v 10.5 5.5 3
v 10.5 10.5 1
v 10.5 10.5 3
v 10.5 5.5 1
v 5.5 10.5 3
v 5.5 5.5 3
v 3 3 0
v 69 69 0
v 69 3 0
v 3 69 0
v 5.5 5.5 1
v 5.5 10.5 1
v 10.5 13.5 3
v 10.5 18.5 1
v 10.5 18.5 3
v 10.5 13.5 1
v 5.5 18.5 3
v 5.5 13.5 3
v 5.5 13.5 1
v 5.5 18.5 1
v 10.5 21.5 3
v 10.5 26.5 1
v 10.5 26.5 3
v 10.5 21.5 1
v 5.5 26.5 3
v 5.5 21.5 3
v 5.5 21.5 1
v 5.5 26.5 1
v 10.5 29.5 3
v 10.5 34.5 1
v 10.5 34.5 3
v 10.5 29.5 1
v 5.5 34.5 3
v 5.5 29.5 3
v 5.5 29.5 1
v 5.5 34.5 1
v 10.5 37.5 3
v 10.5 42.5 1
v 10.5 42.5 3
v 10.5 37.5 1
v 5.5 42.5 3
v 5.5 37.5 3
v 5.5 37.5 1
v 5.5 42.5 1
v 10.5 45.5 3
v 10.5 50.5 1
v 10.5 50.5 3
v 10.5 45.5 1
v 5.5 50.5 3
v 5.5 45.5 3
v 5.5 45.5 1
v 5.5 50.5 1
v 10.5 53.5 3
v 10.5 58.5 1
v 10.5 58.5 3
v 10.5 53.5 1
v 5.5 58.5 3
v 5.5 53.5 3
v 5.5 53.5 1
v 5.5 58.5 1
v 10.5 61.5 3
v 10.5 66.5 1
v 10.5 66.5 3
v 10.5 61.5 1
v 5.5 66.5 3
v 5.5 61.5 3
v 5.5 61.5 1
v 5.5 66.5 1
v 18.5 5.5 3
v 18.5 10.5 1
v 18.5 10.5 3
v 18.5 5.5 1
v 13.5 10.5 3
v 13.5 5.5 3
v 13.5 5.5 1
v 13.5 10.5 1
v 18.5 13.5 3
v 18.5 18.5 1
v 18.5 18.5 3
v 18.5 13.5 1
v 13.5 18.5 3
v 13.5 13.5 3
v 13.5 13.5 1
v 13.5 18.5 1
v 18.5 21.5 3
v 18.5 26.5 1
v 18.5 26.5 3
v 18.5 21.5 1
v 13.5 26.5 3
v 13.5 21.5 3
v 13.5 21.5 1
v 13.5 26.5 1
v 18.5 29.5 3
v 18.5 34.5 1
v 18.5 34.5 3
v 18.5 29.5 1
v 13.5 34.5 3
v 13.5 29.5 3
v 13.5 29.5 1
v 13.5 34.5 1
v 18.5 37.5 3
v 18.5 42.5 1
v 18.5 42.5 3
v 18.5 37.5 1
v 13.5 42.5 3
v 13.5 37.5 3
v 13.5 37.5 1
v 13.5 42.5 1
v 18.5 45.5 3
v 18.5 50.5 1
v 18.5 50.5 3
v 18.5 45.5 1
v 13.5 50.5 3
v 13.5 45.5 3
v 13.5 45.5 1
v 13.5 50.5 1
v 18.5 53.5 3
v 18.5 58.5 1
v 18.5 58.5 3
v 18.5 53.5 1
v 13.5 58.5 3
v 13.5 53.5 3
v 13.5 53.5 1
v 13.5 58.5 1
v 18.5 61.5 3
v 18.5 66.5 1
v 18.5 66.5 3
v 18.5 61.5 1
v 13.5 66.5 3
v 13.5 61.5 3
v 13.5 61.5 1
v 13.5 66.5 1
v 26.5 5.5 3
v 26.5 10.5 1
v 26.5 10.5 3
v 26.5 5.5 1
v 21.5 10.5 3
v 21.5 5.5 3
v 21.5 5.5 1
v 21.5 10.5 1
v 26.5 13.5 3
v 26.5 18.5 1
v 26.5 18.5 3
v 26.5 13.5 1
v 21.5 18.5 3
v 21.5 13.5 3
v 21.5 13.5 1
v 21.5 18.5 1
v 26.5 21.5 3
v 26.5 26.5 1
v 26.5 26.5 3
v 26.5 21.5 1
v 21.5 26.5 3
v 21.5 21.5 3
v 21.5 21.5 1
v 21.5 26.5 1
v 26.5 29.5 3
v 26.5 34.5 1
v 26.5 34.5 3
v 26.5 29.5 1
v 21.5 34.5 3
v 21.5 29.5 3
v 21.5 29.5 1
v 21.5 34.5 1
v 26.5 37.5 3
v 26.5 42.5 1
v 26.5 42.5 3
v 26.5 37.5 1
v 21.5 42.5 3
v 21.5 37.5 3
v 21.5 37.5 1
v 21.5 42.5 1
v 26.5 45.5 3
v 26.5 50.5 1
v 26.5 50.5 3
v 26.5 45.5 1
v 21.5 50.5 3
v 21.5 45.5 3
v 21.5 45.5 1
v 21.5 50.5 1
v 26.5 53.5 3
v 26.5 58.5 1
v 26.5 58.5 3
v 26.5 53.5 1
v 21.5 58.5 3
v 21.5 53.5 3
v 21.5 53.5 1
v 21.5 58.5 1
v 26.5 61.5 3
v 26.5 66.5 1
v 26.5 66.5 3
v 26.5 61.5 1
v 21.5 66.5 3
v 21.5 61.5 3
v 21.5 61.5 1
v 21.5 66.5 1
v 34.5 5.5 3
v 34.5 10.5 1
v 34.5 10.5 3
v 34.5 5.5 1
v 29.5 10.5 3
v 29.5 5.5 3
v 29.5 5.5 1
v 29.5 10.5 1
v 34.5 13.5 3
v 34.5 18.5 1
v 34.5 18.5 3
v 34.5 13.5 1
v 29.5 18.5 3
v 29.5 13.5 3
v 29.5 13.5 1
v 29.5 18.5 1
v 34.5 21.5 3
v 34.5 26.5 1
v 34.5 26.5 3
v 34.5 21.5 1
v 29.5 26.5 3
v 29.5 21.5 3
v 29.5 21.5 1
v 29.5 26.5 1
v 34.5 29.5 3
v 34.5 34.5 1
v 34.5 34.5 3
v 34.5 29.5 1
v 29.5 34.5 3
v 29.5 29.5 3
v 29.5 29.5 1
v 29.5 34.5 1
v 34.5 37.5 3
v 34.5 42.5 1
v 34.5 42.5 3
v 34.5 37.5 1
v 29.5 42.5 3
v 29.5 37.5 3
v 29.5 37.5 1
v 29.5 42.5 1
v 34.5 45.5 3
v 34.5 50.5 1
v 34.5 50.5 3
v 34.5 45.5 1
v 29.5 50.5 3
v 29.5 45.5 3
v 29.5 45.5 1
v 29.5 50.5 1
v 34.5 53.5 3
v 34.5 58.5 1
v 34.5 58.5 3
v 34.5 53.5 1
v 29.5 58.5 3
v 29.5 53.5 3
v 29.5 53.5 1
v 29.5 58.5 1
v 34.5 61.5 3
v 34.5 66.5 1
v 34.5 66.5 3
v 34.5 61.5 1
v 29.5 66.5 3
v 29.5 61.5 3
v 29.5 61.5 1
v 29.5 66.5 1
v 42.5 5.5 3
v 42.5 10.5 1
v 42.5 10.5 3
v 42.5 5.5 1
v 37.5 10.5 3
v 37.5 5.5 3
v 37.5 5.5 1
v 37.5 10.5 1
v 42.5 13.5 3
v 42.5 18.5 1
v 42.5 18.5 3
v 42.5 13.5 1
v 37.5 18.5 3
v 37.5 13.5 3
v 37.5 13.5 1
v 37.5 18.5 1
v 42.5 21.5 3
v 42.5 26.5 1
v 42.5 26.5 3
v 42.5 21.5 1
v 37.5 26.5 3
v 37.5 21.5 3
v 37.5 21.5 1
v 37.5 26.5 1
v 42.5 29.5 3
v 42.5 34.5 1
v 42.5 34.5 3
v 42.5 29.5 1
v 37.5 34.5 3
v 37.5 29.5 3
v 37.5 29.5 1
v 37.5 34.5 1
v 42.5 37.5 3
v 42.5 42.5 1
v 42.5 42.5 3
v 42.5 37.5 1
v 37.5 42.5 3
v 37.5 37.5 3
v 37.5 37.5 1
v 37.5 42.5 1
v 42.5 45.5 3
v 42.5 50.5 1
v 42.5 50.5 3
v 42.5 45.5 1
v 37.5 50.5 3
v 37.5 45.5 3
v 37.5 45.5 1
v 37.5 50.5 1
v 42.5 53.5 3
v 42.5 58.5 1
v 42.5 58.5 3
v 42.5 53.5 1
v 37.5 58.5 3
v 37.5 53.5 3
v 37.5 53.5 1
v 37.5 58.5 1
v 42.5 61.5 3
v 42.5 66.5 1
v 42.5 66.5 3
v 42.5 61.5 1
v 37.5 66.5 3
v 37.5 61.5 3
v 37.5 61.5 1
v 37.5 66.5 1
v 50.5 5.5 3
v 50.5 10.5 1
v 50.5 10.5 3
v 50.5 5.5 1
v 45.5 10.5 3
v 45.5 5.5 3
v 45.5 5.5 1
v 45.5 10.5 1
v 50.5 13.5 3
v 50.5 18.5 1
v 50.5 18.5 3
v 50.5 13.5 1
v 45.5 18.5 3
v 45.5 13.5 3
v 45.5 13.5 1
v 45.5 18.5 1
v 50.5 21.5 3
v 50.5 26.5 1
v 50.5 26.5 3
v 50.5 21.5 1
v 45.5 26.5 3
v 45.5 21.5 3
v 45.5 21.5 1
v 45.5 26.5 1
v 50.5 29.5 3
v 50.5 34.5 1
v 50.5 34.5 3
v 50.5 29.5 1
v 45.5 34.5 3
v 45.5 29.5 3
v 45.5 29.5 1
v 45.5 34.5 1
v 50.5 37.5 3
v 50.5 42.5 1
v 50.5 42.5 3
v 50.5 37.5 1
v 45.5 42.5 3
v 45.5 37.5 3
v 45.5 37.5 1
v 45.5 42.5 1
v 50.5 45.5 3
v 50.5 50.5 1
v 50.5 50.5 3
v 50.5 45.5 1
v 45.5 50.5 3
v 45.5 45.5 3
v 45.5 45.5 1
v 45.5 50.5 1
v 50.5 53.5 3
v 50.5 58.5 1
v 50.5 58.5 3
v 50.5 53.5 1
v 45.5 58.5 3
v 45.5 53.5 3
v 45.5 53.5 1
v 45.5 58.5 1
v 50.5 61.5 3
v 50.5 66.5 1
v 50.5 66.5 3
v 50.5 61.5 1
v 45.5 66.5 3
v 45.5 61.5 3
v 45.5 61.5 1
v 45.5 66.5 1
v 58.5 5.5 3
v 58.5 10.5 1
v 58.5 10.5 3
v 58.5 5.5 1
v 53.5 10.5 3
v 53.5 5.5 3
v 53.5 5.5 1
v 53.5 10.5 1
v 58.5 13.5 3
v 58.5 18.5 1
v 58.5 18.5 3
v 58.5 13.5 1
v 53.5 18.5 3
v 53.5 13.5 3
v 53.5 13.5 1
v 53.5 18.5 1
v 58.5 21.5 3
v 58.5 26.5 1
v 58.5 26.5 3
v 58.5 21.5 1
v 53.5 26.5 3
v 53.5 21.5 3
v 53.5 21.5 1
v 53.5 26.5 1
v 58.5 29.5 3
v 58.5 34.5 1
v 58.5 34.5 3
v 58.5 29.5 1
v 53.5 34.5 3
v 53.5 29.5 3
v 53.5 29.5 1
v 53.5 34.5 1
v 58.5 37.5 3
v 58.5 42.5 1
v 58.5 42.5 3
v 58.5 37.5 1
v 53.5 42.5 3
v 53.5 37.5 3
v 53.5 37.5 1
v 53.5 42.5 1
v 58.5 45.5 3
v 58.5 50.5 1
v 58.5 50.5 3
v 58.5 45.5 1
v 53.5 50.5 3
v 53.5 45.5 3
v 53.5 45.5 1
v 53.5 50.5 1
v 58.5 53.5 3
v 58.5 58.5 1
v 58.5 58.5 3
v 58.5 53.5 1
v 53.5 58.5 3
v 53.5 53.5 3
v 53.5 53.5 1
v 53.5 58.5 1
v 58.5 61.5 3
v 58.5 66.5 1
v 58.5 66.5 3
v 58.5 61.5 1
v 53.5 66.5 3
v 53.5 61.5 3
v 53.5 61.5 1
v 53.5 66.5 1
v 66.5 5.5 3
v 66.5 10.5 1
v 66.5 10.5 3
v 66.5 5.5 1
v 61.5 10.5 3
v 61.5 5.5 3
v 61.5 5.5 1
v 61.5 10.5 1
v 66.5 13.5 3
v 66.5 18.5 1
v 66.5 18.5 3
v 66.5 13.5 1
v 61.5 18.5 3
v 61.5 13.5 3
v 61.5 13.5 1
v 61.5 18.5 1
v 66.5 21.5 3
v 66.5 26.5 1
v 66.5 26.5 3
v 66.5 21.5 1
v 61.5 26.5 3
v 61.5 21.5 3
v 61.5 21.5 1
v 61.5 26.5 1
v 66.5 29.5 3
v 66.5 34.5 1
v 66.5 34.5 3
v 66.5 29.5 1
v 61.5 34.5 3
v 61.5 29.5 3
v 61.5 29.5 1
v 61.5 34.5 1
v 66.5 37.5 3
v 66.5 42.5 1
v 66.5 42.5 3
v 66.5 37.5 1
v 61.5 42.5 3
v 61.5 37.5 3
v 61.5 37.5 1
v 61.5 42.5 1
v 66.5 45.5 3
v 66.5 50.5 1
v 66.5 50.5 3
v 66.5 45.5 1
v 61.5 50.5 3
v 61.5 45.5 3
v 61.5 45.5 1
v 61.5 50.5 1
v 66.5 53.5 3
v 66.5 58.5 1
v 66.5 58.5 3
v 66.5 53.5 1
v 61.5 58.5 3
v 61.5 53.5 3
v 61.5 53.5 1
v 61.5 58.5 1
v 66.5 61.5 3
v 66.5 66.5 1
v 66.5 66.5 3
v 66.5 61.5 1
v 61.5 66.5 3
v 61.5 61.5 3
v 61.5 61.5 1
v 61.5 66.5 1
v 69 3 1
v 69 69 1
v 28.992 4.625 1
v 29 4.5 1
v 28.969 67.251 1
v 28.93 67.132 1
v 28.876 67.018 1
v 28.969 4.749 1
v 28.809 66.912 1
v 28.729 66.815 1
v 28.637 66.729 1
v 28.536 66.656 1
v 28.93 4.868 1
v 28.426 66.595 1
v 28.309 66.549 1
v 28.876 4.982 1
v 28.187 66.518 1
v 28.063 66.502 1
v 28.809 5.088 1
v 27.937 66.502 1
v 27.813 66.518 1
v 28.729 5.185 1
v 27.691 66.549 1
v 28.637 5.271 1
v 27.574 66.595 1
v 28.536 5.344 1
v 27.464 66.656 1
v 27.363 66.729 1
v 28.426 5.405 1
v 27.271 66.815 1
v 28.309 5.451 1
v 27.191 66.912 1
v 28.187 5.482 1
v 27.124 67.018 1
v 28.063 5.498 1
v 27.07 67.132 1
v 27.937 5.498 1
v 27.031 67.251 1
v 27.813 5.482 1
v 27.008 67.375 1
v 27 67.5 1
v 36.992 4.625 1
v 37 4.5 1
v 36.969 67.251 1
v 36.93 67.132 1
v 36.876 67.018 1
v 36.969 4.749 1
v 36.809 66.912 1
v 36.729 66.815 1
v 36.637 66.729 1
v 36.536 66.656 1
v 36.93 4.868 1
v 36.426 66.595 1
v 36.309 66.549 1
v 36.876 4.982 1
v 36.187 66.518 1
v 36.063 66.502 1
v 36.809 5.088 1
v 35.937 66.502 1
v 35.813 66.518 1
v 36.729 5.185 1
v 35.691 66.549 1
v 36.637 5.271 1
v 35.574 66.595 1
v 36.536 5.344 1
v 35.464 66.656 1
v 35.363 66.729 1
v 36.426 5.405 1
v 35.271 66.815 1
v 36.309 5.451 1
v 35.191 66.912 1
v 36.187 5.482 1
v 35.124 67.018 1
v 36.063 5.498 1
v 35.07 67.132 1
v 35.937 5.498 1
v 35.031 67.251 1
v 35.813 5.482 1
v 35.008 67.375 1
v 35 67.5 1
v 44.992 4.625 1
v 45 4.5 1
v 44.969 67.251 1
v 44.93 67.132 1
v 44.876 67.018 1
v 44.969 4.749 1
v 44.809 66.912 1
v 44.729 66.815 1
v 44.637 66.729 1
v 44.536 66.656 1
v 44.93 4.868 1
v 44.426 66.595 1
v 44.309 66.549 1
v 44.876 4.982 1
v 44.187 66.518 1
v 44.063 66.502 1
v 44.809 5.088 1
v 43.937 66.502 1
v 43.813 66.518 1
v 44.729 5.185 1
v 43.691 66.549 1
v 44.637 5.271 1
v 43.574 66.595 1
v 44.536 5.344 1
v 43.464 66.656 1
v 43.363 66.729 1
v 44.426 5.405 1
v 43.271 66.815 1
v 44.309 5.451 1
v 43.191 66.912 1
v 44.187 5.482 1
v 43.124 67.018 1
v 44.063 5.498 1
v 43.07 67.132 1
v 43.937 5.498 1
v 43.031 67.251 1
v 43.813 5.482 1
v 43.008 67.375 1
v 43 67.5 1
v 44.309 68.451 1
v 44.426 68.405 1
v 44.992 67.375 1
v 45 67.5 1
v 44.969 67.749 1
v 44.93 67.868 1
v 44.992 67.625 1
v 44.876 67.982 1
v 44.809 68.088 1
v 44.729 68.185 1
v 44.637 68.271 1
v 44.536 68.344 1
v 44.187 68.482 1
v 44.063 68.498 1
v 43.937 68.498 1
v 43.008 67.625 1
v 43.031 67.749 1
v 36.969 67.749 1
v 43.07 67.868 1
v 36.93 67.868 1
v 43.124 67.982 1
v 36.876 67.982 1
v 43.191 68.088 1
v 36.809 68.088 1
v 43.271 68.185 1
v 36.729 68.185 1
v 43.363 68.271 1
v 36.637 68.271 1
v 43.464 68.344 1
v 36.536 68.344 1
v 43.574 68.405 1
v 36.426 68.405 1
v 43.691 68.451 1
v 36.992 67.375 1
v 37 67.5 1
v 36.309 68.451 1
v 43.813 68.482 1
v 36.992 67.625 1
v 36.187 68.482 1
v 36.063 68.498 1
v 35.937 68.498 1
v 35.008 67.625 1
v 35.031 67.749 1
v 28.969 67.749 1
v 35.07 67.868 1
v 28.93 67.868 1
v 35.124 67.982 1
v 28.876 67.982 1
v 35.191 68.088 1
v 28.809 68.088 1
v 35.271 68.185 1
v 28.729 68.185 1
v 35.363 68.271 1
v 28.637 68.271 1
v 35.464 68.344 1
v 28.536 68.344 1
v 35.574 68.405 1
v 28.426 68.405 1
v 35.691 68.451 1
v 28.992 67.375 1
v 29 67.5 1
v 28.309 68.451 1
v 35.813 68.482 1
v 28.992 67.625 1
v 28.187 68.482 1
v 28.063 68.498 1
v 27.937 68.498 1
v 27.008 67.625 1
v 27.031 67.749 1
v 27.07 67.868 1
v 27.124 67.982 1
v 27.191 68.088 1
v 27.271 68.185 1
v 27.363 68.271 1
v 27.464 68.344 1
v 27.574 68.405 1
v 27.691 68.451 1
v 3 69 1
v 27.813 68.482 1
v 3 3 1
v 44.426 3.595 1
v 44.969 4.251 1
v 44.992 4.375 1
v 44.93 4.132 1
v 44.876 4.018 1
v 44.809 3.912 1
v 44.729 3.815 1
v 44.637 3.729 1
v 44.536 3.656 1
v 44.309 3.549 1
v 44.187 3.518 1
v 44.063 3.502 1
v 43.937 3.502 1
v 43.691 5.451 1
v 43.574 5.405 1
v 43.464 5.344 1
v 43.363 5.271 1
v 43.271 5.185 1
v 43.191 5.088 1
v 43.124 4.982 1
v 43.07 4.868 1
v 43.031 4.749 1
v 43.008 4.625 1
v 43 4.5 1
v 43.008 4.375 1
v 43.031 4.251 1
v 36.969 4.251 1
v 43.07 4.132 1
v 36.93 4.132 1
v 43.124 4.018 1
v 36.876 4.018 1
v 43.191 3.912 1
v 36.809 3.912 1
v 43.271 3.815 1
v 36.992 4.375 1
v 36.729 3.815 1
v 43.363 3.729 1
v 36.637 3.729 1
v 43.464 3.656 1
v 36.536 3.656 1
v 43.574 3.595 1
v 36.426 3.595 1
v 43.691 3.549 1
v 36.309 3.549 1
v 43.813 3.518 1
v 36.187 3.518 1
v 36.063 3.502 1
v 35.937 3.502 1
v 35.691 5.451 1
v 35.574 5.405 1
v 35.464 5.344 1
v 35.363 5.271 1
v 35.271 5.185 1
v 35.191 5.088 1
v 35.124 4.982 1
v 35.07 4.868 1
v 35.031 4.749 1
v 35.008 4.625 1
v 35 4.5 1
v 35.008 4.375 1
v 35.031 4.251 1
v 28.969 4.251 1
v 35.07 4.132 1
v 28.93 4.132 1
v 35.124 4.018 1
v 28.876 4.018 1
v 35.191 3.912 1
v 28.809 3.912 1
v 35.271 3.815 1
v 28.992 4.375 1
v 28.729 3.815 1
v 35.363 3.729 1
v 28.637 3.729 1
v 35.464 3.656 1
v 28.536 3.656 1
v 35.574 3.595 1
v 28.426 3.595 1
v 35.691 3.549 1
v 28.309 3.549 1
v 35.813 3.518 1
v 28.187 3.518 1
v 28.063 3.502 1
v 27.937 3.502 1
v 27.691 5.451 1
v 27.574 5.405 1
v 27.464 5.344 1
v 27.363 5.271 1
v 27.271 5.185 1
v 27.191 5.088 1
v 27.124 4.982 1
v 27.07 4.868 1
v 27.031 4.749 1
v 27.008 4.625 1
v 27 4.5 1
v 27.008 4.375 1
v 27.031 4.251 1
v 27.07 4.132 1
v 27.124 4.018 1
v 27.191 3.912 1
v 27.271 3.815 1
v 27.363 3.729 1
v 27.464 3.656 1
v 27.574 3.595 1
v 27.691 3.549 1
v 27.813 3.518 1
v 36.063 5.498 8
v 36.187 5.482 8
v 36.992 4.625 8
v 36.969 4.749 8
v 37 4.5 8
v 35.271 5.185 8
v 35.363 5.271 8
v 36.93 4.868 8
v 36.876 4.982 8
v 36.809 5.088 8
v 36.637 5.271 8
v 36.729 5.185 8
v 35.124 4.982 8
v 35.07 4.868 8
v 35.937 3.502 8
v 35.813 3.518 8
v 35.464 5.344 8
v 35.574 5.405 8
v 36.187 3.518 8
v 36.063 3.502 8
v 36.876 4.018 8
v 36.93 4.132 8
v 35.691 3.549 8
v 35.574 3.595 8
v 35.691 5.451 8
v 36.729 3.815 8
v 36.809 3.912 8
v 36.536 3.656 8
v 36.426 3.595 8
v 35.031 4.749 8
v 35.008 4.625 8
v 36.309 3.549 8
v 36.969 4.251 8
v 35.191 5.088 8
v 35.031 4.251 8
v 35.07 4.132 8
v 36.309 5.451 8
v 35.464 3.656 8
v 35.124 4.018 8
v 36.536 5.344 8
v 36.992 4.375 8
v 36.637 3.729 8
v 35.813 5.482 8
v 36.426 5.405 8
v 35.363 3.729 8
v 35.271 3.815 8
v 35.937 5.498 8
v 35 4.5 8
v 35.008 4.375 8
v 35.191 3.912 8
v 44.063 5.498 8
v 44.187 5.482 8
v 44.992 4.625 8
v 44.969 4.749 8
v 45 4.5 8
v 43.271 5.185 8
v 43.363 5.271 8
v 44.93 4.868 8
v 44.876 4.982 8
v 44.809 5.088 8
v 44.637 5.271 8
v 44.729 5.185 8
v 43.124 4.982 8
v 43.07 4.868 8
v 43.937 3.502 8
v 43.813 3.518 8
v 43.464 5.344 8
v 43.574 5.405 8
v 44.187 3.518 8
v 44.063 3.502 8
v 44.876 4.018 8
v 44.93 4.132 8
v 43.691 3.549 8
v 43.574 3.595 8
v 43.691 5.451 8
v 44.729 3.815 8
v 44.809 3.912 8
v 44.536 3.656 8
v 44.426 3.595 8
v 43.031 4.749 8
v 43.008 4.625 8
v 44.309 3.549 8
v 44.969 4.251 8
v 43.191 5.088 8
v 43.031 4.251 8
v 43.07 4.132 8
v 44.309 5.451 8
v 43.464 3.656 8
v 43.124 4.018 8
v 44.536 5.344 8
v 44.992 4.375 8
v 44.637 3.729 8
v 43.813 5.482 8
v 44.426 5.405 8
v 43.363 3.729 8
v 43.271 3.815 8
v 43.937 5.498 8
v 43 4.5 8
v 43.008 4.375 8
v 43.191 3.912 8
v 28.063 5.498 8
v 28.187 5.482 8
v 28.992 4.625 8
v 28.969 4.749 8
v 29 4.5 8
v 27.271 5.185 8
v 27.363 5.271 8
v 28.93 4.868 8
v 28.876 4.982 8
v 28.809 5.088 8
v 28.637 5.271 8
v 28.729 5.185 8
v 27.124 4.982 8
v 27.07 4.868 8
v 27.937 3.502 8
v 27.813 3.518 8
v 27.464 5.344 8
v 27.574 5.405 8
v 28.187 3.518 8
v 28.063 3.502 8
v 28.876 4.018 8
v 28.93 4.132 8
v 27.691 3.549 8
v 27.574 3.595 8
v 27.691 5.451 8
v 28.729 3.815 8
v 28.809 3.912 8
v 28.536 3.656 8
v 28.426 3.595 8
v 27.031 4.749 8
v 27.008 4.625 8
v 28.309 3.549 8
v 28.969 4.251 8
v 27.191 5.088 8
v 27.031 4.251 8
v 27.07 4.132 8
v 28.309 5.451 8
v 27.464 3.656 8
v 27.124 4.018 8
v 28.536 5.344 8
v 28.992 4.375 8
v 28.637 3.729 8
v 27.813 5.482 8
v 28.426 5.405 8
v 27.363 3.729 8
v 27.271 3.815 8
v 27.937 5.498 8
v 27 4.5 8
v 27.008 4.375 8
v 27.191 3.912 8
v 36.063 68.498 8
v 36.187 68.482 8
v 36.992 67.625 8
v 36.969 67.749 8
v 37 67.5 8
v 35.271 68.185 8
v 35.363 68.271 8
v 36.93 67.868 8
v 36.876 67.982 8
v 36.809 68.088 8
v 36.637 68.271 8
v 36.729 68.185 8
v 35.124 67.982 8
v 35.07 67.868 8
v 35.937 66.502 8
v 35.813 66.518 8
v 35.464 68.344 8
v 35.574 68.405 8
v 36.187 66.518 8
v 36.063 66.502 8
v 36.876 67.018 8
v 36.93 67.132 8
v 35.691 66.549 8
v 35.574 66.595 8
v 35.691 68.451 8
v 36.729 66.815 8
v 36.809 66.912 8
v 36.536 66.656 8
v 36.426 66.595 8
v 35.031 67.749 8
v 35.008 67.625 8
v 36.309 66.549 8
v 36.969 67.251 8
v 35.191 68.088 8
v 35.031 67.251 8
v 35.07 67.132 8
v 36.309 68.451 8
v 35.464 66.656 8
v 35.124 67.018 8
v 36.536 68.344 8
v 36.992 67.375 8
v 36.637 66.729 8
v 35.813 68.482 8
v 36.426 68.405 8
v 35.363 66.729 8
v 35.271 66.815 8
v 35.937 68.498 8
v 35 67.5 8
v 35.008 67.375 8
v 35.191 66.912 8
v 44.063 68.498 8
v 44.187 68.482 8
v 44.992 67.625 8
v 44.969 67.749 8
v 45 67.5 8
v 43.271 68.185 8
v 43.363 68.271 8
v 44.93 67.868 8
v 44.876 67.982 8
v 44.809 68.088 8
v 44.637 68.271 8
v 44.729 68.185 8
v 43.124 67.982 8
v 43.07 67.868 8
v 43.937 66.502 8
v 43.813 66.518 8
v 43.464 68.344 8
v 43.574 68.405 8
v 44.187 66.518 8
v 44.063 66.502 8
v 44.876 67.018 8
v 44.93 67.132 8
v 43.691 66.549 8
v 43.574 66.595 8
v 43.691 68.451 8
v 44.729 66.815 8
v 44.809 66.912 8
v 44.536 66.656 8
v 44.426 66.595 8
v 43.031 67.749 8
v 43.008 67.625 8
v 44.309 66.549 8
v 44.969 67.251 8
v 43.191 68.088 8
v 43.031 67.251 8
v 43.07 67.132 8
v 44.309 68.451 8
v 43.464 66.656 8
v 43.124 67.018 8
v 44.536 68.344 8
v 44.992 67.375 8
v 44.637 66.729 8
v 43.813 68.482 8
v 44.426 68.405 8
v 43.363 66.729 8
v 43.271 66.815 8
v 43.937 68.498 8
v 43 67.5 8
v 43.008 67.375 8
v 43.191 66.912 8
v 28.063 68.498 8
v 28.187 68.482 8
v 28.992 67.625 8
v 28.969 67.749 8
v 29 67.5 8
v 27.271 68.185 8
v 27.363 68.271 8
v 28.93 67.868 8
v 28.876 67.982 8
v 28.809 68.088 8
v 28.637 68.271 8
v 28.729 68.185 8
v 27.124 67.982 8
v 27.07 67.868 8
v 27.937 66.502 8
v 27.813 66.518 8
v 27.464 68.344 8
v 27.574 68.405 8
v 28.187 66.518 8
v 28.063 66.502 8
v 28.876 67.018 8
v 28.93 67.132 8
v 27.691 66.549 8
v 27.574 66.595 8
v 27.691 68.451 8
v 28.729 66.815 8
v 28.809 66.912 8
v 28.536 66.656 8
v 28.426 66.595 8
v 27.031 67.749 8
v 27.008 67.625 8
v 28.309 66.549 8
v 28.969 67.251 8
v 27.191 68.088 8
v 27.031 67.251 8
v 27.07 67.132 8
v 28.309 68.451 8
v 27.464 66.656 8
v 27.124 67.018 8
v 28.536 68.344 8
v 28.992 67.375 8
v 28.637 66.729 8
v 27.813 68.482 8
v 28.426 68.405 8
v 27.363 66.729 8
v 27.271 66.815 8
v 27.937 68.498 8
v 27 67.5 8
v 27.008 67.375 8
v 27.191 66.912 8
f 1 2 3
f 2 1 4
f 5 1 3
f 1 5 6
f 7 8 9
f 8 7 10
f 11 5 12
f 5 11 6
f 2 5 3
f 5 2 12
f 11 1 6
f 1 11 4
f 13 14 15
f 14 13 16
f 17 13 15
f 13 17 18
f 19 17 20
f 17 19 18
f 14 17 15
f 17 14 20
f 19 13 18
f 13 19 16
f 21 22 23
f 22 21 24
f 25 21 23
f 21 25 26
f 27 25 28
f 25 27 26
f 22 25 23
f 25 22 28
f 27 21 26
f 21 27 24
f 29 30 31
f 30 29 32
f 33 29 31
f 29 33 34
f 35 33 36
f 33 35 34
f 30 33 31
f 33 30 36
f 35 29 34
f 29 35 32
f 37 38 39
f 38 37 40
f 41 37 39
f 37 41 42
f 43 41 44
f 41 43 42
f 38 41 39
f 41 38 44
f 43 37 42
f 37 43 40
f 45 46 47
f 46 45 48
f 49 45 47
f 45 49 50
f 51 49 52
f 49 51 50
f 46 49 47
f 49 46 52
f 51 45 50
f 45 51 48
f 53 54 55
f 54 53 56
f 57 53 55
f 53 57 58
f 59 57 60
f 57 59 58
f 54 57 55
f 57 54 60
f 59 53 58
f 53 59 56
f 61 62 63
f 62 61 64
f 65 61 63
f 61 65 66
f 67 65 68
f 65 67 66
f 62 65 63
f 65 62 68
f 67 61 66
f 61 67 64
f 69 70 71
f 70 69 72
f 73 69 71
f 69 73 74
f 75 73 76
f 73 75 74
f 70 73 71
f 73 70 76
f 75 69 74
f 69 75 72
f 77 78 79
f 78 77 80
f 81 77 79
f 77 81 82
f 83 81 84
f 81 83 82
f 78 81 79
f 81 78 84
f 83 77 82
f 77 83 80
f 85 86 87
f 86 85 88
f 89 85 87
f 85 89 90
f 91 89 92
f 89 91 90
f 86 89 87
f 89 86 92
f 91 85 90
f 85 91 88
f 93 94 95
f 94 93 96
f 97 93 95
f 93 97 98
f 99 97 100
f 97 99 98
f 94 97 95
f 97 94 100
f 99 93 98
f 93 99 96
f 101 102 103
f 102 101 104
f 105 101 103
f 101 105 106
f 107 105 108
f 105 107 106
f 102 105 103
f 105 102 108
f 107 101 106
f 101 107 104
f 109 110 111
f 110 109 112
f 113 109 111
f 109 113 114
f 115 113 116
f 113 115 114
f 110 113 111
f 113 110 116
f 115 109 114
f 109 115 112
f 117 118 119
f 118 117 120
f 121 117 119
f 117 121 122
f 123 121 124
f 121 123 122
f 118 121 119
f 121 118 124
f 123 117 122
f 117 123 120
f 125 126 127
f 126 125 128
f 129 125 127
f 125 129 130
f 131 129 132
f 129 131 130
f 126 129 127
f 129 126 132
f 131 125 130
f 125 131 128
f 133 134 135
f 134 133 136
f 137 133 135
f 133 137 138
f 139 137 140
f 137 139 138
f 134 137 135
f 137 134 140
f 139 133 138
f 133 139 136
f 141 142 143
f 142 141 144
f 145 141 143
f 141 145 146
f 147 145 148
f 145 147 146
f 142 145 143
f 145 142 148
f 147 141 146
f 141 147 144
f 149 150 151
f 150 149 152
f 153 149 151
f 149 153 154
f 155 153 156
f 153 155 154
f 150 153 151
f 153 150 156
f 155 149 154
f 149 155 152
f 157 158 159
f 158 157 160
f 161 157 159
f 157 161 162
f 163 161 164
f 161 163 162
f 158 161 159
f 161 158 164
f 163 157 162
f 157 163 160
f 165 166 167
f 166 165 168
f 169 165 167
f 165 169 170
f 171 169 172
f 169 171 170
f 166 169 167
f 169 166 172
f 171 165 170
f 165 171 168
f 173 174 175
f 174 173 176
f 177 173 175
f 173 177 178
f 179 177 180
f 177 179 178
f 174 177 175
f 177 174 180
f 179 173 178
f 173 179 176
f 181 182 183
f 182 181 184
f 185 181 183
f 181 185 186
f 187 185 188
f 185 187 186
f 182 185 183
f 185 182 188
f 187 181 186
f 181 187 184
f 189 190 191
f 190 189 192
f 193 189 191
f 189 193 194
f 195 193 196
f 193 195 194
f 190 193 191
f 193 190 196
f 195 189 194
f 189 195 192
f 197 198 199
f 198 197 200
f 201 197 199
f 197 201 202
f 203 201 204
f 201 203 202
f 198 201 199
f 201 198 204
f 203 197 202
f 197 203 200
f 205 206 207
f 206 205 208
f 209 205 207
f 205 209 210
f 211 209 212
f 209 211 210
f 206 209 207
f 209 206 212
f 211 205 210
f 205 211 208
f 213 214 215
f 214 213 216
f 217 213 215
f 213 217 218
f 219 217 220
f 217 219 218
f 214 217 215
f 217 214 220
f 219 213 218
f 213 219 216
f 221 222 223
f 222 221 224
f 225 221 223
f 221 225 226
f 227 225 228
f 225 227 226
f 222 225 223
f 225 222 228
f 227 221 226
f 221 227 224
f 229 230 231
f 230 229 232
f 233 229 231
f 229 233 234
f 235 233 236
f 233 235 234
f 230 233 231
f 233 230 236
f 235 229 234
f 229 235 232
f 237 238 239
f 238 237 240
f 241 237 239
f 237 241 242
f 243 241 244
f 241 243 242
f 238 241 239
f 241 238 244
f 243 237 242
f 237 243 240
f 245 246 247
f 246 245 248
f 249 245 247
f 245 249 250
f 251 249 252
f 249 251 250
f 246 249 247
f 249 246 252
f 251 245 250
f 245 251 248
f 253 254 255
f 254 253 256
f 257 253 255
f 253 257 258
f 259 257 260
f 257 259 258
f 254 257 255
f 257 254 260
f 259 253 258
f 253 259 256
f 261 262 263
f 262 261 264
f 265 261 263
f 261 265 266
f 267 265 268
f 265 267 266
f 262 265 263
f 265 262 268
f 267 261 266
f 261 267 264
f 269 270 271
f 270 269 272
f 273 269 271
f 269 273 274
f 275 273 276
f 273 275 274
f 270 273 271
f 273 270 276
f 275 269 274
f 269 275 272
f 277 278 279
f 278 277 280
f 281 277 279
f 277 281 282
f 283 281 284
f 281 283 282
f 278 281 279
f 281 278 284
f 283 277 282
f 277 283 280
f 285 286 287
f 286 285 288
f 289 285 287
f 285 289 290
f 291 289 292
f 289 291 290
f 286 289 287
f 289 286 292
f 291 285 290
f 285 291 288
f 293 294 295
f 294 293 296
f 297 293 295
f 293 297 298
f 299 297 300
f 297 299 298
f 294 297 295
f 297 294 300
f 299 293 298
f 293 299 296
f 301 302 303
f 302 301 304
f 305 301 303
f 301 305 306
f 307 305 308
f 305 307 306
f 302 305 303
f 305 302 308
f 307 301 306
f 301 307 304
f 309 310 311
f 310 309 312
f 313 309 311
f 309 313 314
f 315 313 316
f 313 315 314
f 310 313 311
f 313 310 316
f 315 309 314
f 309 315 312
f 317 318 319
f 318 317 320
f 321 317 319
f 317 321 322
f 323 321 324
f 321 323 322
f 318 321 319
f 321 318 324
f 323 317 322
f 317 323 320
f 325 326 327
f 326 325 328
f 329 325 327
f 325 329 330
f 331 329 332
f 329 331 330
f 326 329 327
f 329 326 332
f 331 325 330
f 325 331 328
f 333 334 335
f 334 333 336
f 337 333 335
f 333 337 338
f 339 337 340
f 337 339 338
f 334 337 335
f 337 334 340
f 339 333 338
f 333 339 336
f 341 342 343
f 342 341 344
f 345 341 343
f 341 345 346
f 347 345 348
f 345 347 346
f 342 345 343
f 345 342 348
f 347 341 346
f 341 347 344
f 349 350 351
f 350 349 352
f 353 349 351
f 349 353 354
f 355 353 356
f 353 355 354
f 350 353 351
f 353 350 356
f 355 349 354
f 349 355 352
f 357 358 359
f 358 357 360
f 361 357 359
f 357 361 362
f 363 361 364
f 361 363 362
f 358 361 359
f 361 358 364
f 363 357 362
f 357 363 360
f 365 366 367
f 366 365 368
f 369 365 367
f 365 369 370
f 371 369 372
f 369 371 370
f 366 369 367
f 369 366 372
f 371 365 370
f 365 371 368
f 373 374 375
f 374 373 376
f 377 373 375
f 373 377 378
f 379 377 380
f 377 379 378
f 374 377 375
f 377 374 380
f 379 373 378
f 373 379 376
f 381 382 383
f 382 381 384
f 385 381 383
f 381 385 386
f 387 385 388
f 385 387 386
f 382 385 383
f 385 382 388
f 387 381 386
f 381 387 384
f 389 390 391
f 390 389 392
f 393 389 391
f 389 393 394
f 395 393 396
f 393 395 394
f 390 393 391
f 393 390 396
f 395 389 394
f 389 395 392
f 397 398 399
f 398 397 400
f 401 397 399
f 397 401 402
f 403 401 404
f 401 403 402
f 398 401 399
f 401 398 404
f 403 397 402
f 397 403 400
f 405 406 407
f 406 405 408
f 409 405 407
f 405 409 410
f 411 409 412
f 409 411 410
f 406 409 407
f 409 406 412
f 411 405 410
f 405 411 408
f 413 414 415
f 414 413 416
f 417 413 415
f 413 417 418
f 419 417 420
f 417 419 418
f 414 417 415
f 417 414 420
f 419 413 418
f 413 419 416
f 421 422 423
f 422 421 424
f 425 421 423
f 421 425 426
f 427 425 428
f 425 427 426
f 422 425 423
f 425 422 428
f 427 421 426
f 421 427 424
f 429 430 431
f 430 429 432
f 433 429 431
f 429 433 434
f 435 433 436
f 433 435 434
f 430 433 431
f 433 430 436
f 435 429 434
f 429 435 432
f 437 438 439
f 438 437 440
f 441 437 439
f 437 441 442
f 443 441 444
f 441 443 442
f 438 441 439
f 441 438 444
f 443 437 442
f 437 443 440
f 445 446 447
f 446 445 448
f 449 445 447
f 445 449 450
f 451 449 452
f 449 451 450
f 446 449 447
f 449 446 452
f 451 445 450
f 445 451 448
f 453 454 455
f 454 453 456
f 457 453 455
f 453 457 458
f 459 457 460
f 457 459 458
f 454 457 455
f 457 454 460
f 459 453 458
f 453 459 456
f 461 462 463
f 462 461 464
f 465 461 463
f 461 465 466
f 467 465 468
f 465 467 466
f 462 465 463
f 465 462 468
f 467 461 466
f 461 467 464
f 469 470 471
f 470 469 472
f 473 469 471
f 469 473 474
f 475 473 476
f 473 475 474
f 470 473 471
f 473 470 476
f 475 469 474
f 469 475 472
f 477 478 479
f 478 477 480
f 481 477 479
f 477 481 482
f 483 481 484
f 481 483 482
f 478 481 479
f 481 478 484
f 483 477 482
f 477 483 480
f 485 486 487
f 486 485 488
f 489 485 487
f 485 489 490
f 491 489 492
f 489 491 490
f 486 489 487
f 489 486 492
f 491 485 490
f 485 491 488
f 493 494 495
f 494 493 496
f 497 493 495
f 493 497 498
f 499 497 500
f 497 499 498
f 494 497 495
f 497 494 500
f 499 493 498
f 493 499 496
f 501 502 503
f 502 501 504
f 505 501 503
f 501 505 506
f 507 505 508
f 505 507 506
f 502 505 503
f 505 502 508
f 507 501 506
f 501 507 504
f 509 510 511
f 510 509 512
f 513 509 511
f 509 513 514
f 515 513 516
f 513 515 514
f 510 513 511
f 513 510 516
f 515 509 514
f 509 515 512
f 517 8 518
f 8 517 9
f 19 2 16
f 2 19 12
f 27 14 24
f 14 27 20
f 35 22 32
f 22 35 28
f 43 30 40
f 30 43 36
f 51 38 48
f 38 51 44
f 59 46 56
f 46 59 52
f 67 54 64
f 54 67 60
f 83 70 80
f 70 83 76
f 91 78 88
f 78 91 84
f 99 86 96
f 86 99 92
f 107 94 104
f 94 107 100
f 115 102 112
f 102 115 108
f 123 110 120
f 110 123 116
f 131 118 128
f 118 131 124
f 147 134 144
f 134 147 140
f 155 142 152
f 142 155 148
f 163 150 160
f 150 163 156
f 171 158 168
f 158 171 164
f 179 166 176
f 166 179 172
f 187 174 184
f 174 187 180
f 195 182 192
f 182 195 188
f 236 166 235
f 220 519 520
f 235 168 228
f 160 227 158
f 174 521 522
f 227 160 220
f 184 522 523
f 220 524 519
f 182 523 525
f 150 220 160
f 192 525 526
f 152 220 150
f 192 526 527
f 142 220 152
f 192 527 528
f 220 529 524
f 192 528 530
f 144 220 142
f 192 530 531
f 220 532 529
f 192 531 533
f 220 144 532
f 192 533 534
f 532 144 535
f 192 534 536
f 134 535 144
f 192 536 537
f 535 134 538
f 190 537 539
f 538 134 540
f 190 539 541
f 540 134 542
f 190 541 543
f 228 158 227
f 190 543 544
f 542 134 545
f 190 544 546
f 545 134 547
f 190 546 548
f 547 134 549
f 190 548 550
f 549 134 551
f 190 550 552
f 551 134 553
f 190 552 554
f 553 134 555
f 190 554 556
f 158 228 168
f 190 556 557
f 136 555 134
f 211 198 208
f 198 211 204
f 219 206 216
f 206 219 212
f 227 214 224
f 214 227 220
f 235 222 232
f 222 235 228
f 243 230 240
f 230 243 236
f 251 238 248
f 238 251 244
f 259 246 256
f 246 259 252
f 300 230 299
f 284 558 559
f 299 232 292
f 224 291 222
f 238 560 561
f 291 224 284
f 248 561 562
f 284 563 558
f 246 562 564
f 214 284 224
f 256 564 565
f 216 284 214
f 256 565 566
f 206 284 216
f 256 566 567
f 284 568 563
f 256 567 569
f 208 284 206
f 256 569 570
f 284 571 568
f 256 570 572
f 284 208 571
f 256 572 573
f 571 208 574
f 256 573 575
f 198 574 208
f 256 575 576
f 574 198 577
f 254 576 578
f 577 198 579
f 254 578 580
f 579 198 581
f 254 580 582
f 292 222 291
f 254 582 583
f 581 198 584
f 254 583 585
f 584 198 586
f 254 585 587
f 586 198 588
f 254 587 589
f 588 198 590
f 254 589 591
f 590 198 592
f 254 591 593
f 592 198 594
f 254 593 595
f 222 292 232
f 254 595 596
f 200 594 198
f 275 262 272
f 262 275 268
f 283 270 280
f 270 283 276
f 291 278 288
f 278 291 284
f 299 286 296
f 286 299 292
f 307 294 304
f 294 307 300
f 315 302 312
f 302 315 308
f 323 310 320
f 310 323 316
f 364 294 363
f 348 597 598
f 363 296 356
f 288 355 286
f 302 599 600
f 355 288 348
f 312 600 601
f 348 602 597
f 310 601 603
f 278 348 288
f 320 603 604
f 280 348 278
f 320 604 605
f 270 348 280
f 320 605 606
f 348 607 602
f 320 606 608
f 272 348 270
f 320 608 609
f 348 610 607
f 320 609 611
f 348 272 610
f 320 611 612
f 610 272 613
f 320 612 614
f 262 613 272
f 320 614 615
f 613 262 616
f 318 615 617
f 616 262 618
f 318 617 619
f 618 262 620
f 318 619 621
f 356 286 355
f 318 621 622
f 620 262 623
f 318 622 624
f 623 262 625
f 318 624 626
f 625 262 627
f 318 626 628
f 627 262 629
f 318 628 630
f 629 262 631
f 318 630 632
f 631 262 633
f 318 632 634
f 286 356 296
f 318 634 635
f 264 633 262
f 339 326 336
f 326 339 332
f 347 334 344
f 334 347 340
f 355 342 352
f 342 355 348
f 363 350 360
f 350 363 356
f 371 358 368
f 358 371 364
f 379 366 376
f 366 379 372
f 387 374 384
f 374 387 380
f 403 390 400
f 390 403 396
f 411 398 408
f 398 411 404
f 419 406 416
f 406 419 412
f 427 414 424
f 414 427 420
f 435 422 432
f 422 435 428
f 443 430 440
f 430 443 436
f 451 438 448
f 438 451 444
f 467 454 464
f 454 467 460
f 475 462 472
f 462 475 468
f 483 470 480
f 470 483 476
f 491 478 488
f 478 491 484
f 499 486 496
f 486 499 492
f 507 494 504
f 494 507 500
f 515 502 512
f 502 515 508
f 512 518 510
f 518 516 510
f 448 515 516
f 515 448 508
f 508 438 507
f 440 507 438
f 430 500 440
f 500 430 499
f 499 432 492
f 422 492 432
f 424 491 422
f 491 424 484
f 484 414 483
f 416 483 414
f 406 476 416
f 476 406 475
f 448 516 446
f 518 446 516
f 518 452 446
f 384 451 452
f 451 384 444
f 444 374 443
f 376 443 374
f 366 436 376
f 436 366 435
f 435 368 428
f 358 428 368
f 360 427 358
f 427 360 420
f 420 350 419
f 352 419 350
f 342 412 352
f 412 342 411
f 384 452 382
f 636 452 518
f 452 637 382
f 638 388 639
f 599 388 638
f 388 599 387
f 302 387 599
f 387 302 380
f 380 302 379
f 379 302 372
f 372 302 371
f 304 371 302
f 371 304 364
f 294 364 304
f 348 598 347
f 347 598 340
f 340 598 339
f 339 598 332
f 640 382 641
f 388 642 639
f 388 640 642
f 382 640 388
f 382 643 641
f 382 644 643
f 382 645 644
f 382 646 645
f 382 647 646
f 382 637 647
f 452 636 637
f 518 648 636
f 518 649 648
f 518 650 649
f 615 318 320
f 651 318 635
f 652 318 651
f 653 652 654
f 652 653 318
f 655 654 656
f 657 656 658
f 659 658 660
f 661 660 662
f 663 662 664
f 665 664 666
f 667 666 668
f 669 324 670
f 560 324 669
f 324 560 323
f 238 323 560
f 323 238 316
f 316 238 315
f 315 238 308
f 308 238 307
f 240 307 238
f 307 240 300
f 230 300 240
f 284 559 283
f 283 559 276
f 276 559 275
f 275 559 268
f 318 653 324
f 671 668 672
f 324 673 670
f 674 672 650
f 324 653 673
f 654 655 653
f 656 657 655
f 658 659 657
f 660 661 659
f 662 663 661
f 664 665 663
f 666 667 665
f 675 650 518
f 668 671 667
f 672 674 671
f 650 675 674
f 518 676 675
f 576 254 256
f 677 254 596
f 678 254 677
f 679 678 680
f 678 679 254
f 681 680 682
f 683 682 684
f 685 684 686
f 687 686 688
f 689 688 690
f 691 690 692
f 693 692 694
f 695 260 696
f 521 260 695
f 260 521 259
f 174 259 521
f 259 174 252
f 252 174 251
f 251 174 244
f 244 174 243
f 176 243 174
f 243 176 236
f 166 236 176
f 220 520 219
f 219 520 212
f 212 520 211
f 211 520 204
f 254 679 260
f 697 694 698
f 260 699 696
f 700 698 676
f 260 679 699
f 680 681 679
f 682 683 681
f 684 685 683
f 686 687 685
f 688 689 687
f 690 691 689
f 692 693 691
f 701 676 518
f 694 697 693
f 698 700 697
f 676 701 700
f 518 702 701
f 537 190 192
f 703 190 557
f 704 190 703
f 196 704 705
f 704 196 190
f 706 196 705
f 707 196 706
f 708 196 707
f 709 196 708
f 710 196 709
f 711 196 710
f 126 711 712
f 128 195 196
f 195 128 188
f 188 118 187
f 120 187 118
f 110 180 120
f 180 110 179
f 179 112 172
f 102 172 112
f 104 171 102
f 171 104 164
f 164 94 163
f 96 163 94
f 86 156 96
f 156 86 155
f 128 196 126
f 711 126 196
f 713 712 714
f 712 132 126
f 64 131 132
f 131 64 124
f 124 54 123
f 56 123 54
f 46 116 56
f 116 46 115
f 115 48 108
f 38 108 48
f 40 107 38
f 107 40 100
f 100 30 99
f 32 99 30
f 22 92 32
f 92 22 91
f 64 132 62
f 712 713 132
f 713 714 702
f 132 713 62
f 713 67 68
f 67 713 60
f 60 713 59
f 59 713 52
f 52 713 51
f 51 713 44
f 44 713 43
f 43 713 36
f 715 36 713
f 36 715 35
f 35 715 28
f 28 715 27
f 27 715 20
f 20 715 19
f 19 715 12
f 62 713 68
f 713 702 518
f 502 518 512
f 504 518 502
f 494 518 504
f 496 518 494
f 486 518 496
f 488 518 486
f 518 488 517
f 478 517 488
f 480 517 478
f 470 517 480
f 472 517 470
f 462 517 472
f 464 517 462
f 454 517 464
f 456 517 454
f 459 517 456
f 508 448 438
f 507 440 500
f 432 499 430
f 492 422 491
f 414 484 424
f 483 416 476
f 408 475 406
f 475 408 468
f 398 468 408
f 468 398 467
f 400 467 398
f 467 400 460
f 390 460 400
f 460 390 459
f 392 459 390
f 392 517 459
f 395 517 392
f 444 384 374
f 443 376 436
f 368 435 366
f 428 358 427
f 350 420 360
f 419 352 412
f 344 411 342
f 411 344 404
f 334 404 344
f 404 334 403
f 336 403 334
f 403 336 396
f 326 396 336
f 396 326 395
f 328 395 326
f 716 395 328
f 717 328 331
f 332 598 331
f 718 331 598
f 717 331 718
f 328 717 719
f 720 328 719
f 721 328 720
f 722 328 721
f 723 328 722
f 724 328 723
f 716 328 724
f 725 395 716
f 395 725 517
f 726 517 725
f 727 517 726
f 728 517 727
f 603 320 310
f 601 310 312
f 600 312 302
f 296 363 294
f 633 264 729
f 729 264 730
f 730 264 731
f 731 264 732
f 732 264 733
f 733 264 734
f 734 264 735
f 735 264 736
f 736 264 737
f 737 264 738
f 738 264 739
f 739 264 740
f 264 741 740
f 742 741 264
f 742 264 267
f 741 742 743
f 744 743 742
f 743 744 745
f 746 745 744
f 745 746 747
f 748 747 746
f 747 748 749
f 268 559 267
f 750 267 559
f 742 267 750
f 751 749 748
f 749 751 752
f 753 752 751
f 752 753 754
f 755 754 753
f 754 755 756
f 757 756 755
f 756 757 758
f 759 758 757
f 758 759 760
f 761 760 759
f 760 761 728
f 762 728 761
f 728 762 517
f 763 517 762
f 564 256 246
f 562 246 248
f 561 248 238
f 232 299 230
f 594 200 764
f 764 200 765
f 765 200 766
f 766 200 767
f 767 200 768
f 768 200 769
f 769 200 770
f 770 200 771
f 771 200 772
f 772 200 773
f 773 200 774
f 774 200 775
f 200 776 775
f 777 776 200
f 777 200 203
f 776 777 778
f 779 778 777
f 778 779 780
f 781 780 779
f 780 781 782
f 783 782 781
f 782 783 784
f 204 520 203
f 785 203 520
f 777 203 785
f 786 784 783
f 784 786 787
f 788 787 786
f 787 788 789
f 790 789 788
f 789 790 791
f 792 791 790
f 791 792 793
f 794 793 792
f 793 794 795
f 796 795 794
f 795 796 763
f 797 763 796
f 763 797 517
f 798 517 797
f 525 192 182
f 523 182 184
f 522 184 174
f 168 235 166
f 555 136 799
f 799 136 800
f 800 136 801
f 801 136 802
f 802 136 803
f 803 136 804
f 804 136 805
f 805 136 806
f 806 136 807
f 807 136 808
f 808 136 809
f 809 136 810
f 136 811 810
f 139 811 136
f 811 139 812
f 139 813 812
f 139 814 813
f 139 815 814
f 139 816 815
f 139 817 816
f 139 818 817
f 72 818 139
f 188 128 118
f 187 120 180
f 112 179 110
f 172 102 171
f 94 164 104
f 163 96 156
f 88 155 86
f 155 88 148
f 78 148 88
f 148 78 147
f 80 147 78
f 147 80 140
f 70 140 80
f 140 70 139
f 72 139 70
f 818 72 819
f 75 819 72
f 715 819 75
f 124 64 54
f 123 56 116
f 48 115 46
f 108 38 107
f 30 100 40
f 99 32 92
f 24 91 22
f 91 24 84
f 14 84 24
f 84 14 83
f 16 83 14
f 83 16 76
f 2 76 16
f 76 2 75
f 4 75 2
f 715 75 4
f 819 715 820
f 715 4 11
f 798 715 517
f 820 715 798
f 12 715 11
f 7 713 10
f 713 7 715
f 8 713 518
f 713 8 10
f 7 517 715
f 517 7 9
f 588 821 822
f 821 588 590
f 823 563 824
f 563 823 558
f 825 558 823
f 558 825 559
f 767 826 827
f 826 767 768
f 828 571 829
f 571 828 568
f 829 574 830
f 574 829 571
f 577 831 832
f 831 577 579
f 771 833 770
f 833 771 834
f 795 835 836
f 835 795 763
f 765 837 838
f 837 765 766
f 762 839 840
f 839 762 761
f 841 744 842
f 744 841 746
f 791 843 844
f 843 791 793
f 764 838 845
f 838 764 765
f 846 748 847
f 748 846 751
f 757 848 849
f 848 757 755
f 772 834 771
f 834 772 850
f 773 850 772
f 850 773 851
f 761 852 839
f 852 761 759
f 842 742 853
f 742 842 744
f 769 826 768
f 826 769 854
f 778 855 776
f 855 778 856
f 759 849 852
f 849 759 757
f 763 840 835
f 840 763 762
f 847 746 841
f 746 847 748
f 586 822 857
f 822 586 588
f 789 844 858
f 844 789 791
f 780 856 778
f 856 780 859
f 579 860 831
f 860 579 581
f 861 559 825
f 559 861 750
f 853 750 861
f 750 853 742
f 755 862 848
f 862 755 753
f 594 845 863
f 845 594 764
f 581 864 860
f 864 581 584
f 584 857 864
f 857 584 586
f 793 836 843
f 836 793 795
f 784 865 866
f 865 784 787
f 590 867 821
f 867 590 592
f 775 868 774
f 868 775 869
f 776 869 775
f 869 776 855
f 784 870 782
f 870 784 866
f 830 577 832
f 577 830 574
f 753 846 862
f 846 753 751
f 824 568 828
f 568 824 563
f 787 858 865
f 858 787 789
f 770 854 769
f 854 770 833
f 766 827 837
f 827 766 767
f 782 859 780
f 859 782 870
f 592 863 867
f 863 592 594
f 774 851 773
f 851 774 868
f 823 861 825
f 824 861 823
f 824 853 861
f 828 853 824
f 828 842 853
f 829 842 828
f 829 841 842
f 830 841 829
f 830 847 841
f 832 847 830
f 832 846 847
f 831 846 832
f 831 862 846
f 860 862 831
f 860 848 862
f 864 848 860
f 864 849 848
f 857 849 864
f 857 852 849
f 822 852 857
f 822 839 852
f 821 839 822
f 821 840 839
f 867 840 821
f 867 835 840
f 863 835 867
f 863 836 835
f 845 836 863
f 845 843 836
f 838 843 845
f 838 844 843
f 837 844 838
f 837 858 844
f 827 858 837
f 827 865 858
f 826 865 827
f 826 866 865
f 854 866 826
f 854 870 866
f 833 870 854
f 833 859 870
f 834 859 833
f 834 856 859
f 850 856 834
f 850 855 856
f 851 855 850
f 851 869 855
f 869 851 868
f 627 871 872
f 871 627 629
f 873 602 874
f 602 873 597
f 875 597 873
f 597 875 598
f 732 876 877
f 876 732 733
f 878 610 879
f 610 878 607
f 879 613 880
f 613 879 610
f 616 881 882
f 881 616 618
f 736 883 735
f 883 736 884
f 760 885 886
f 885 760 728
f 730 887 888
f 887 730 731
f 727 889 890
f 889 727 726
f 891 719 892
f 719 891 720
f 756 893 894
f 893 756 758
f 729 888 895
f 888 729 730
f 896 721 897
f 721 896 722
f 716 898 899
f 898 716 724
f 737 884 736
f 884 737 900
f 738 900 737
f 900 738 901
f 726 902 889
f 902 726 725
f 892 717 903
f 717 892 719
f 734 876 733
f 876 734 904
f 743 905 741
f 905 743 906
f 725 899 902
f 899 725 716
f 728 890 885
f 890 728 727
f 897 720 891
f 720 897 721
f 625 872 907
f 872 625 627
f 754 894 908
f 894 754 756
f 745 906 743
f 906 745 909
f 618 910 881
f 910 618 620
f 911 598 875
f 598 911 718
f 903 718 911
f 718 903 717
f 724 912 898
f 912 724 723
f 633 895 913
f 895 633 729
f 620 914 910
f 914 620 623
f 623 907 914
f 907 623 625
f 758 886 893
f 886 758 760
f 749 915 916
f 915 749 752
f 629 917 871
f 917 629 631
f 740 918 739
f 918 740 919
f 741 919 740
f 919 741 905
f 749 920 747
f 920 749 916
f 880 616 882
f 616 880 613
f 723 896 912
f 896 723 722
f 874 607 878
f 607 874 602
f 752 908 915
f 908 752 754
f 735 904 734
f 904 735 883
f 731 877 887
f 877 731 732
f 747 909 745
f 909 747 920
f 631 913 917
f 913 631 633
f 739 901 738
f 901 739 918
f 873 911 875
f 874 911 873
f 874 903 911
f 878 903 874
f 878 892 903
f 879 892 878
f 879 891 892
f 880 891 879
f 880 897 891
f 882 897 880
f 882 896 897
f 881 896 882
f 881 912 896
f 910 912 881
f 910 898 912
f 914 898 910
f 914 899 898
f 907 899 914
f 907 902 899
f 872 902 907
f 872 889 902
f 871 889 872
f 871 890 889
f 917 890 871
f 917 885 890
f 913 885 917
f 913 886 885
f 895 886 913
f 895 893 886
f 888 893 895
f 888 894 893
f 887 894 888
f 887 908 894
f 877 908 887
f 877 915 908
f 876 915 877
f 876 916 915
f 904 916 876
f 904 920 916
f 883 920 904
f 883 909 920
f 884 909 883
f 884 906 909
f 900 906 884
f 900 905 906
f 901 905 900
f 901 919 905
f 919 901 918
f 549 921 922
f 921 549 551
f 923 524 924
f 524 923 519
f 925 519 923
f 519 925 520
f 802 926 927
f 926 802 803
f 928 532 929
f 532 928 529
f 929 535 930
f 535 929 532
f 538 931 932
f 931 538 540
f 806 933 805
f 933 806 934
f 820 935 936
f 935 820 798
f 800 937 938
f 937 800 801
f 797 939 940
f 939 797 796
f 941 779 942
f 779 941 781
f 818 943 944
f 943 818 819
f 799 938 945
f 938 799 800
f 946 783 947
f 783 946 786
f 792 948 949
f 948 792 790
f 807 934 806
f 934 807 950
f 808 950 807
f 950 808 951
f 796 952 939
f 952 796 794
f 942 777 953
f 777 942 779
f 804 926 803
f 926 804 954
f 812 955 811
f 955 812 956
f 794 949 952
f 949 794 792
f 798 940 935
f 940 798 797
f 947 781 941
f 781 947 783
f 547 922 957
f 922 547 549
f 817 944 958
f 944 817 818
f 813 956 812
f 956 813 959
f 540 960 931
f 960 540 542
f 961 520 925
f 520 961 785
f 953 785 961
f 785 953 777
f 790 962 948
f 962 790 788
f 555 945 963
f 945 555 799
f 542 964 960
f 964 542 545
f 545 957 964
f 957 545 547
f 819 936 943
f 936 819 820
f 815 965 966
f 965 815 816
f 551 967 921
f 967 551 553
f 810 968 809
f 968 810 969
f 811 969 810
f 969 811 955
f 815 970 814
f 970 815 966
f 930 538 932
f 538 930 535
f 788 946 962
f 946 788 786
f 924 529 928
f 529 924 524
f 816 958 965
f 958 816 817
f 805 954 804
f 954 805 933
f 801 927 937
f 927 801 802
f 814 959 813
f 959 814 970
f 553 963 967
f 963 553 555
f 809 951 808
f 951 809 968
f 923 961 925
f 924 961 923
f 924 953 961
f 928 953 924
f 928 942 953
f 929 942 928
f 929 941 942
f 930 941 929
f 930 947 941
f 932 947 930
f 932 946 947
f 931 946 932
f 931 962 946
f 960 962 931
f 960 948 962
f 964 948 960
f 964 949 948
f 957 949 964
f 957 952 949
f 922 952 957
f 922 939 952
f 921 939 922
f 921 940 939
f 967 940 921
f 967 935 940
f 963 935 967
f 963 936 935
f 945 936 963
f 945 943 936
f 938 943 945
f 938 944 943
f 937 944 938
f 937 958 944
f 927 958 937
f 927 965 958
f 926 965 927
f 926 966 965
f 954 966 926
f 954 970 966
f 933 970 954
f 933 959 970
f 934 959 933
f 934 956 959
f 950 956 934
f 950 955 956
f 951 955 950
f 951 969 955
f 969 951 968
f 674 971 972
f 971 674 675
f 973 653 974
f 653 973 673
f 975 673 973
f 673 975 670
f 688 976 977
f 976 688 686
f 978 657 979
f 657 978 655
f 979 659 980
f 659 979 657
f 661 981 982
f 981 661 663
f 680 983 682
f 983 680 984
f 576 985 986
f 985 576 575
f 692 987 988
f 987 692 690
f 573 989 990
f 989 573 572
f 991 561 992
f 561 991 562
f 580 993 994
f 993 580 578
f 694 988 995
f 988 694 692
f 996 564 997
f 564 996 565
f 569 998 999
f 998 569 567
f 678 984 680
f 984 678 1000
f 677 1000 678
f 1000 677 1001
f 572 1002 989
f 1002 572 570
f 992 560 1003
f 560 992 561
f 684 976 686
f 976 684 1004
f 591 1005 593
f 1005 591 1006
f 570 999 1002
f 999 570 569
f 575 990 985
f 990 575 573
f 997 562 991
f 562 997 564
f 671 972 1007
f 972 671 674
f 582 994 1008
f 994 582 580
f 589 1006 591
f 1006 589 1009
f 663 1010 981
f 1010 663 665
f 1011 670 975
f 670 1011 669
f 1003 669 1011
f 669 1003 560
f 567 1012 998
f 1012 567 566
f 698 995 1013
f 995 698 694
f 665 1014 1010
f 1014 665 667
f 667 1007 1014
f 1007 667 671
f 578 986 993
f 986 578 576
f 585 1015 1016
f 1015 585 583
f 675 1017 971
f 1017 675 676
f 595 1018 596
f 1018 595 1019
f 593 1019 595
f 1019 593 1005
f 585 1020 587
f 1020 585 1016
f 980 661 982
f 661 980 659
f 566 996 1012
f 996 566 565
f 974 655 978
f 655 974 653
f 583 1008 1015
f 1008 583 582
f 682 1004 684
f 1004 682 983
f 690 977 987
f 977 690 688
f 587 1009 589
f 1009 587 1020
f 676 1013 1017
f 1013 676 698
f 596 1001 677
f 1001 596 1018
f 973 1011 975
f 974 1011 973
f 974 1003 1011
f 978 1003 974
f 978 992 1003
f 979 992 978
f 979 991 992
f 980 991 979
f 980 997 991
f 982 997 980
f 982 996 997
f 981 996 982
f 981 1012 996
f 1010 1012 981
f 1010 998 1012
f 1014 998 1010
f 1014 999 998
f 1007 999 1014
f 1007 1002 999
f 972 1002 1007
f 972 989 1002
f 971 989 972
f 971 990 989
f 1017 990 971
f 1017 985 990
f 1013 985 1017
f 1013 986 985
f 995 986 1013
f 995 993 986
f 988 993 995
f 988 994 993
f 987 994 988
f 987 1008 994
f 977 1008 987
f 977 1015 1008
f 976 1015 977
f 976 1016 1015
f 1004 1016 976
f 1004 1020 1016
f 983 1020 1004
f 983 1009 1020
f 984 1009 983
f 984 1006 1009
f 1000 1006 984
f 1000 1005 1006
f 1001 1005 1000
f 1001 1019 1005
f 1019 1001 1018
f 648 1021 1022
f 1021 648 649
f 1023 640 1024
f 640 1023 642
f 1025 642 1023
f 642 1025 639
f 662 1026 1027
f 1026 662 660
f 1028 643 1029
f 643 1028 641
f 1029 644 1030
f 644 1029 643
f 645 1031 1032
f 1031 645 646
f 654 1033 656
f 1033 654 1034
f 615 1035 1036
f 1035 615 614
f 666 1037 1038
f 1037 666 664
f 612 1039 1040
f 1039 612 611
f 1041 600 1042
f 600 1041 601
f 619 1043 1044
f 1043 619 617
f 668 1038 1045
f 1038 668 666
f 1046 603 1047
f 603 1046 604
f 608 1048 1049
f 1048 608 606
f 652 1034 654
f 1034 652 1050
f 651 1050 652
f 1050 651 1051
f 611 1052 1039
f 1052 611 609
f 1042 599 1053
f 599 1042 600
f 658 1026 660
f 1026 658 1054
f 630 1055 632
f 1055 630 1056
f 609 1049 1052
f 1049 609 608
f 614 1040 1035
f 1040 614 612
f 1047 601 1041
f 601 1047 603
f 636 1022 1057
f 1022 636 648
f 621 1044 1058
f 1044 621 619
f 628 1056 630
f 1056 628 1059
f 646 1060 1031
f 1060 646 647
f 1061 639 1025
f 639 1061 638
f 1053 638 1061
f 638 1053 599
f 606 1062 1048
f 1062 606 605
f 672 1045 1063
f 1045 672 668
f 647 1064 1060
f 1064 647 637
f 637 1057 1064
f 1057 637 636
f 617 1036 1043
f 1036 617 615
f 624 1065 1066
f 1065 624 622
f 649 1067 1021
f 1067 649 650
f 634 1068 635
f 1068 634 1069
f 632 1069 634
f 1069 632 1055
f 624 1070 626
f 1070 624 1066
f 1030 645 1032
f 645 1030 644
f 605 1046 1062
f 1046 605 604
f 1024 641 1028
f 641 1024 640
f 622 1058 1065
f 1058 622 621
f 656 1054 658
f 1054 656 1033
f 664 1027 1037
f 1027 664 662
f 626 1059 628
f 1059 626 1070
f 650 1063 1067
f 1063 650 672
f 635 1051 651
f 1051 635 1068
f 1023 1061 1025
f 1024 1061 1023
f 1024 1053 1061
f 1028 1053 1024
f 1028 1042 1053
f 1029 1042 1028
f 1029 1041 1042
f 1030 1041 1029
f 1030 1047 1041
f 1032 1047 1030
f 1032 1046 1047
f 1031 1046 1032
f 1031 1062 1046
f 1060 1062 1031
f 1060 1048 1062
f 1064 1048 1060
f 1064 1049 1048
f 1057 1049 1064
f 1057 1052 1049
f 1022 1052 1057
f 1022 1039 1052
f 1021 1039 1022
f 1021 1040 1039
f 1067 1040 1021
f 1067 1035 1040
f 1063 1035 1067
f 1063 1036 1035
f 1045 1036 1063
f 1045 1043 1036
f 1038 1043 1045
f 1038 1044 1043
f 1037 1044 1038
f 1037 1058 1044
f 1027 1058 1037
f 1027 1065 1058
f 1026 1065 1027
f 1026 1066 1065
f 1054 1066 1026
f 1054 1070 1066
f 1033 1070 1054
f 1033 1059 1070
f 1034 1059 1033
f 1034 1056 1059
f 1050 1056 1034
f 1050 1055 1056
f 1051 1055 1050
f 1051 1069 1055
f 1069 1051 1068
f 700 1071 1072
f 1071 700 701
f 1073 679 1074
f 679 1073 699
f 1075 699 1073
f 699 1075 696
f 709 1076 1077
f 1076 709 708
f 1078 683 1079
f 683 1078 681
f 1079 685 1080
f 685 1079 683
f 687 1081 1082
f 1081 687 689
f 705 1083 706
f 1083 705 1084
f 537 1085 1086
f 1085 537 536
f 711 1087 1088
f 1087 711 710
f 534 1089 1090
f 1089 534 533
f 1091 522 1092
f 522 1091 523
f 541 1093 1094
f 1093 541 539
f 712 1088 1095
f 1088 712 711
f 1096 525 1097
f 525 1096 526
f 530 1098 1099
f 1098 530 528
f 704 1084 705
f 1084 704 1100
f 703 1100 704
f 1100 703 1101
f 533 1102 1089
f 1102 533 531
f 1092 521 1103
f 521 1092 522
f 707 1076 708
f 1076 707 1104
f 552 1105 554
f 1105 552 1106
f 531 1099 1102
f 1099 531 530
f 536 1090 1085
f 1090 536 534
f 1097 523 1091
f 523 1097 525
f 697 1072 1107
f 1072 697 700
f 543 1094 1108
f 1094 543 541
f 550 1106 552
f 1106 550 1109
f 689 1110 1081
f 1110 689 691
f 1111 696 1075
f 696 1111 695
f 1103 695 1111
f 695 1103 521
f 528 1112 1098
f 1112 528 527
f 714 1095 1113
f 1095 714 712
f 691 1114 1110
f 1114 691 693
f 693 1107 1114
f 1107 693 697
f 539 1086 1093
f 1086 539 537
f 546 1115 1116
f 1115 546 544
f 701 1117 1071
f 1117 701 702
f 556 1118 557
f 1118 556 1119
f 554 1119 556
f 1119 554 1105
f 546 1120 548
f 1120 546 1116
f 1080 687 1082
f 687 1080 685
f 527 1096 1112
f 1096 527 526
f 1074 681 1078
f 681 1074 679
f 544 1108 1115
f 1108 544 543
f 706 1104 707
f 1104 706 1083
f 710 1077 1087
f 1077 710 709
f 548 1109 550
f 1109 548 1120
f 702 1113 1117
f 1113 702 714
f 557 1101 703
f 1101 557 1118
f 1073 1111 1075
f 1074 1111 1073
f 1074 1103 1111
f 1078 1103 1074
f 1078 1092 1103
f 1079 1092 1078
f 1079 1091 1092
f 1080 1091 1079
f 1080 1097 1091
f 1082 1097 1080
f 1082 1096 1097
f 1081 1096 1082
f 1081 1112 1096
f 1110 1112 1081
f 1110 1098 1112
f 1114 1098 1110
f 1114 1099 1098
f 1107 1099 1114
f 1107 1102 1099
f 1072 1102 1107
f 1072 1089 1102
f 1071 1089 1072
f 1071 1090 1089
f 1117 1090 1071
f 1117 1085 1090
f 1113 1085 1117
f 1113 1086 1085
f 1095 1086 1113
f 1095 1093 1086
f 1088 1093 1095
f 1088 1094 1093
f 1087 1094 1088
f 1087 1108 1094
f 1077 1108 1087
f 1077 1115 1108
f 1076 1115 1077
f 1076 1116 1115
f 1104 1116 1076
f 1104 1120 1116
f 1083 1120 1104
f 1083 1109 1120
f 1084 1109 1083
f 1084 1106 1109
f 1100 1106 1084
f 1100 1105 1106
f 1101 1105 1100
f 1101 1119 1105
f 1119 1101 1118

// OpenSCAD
$fn=50;
union(){
    union(){
        translate([3,3,0])cube([66,66,1]);
        translate([0,0,1.5])for(i = [1 : 1 : 8])for(j = [1 : 1 : 8])    translate([i*8,j*8,0])cube([5,5,3], center=true);
        }
    translate([33+3,1.5+3,0])cylinder(d=2,h=8);
    translate([33+3+8,1.5+3,0])cylinder(d=2,h=8);
    translate([33+3-8,1.5+3,0])cylinder(d=2,h=8);
    translate([33+3,66-1.5+3,0])cylinder(d=2,h=8);
    translate([33+3+8,66-1.5+3,0])cylinder(d=2,h=8);
    translate([33+3-8,66-1.5+3,0])cylinder(d=2,h=8);
}
